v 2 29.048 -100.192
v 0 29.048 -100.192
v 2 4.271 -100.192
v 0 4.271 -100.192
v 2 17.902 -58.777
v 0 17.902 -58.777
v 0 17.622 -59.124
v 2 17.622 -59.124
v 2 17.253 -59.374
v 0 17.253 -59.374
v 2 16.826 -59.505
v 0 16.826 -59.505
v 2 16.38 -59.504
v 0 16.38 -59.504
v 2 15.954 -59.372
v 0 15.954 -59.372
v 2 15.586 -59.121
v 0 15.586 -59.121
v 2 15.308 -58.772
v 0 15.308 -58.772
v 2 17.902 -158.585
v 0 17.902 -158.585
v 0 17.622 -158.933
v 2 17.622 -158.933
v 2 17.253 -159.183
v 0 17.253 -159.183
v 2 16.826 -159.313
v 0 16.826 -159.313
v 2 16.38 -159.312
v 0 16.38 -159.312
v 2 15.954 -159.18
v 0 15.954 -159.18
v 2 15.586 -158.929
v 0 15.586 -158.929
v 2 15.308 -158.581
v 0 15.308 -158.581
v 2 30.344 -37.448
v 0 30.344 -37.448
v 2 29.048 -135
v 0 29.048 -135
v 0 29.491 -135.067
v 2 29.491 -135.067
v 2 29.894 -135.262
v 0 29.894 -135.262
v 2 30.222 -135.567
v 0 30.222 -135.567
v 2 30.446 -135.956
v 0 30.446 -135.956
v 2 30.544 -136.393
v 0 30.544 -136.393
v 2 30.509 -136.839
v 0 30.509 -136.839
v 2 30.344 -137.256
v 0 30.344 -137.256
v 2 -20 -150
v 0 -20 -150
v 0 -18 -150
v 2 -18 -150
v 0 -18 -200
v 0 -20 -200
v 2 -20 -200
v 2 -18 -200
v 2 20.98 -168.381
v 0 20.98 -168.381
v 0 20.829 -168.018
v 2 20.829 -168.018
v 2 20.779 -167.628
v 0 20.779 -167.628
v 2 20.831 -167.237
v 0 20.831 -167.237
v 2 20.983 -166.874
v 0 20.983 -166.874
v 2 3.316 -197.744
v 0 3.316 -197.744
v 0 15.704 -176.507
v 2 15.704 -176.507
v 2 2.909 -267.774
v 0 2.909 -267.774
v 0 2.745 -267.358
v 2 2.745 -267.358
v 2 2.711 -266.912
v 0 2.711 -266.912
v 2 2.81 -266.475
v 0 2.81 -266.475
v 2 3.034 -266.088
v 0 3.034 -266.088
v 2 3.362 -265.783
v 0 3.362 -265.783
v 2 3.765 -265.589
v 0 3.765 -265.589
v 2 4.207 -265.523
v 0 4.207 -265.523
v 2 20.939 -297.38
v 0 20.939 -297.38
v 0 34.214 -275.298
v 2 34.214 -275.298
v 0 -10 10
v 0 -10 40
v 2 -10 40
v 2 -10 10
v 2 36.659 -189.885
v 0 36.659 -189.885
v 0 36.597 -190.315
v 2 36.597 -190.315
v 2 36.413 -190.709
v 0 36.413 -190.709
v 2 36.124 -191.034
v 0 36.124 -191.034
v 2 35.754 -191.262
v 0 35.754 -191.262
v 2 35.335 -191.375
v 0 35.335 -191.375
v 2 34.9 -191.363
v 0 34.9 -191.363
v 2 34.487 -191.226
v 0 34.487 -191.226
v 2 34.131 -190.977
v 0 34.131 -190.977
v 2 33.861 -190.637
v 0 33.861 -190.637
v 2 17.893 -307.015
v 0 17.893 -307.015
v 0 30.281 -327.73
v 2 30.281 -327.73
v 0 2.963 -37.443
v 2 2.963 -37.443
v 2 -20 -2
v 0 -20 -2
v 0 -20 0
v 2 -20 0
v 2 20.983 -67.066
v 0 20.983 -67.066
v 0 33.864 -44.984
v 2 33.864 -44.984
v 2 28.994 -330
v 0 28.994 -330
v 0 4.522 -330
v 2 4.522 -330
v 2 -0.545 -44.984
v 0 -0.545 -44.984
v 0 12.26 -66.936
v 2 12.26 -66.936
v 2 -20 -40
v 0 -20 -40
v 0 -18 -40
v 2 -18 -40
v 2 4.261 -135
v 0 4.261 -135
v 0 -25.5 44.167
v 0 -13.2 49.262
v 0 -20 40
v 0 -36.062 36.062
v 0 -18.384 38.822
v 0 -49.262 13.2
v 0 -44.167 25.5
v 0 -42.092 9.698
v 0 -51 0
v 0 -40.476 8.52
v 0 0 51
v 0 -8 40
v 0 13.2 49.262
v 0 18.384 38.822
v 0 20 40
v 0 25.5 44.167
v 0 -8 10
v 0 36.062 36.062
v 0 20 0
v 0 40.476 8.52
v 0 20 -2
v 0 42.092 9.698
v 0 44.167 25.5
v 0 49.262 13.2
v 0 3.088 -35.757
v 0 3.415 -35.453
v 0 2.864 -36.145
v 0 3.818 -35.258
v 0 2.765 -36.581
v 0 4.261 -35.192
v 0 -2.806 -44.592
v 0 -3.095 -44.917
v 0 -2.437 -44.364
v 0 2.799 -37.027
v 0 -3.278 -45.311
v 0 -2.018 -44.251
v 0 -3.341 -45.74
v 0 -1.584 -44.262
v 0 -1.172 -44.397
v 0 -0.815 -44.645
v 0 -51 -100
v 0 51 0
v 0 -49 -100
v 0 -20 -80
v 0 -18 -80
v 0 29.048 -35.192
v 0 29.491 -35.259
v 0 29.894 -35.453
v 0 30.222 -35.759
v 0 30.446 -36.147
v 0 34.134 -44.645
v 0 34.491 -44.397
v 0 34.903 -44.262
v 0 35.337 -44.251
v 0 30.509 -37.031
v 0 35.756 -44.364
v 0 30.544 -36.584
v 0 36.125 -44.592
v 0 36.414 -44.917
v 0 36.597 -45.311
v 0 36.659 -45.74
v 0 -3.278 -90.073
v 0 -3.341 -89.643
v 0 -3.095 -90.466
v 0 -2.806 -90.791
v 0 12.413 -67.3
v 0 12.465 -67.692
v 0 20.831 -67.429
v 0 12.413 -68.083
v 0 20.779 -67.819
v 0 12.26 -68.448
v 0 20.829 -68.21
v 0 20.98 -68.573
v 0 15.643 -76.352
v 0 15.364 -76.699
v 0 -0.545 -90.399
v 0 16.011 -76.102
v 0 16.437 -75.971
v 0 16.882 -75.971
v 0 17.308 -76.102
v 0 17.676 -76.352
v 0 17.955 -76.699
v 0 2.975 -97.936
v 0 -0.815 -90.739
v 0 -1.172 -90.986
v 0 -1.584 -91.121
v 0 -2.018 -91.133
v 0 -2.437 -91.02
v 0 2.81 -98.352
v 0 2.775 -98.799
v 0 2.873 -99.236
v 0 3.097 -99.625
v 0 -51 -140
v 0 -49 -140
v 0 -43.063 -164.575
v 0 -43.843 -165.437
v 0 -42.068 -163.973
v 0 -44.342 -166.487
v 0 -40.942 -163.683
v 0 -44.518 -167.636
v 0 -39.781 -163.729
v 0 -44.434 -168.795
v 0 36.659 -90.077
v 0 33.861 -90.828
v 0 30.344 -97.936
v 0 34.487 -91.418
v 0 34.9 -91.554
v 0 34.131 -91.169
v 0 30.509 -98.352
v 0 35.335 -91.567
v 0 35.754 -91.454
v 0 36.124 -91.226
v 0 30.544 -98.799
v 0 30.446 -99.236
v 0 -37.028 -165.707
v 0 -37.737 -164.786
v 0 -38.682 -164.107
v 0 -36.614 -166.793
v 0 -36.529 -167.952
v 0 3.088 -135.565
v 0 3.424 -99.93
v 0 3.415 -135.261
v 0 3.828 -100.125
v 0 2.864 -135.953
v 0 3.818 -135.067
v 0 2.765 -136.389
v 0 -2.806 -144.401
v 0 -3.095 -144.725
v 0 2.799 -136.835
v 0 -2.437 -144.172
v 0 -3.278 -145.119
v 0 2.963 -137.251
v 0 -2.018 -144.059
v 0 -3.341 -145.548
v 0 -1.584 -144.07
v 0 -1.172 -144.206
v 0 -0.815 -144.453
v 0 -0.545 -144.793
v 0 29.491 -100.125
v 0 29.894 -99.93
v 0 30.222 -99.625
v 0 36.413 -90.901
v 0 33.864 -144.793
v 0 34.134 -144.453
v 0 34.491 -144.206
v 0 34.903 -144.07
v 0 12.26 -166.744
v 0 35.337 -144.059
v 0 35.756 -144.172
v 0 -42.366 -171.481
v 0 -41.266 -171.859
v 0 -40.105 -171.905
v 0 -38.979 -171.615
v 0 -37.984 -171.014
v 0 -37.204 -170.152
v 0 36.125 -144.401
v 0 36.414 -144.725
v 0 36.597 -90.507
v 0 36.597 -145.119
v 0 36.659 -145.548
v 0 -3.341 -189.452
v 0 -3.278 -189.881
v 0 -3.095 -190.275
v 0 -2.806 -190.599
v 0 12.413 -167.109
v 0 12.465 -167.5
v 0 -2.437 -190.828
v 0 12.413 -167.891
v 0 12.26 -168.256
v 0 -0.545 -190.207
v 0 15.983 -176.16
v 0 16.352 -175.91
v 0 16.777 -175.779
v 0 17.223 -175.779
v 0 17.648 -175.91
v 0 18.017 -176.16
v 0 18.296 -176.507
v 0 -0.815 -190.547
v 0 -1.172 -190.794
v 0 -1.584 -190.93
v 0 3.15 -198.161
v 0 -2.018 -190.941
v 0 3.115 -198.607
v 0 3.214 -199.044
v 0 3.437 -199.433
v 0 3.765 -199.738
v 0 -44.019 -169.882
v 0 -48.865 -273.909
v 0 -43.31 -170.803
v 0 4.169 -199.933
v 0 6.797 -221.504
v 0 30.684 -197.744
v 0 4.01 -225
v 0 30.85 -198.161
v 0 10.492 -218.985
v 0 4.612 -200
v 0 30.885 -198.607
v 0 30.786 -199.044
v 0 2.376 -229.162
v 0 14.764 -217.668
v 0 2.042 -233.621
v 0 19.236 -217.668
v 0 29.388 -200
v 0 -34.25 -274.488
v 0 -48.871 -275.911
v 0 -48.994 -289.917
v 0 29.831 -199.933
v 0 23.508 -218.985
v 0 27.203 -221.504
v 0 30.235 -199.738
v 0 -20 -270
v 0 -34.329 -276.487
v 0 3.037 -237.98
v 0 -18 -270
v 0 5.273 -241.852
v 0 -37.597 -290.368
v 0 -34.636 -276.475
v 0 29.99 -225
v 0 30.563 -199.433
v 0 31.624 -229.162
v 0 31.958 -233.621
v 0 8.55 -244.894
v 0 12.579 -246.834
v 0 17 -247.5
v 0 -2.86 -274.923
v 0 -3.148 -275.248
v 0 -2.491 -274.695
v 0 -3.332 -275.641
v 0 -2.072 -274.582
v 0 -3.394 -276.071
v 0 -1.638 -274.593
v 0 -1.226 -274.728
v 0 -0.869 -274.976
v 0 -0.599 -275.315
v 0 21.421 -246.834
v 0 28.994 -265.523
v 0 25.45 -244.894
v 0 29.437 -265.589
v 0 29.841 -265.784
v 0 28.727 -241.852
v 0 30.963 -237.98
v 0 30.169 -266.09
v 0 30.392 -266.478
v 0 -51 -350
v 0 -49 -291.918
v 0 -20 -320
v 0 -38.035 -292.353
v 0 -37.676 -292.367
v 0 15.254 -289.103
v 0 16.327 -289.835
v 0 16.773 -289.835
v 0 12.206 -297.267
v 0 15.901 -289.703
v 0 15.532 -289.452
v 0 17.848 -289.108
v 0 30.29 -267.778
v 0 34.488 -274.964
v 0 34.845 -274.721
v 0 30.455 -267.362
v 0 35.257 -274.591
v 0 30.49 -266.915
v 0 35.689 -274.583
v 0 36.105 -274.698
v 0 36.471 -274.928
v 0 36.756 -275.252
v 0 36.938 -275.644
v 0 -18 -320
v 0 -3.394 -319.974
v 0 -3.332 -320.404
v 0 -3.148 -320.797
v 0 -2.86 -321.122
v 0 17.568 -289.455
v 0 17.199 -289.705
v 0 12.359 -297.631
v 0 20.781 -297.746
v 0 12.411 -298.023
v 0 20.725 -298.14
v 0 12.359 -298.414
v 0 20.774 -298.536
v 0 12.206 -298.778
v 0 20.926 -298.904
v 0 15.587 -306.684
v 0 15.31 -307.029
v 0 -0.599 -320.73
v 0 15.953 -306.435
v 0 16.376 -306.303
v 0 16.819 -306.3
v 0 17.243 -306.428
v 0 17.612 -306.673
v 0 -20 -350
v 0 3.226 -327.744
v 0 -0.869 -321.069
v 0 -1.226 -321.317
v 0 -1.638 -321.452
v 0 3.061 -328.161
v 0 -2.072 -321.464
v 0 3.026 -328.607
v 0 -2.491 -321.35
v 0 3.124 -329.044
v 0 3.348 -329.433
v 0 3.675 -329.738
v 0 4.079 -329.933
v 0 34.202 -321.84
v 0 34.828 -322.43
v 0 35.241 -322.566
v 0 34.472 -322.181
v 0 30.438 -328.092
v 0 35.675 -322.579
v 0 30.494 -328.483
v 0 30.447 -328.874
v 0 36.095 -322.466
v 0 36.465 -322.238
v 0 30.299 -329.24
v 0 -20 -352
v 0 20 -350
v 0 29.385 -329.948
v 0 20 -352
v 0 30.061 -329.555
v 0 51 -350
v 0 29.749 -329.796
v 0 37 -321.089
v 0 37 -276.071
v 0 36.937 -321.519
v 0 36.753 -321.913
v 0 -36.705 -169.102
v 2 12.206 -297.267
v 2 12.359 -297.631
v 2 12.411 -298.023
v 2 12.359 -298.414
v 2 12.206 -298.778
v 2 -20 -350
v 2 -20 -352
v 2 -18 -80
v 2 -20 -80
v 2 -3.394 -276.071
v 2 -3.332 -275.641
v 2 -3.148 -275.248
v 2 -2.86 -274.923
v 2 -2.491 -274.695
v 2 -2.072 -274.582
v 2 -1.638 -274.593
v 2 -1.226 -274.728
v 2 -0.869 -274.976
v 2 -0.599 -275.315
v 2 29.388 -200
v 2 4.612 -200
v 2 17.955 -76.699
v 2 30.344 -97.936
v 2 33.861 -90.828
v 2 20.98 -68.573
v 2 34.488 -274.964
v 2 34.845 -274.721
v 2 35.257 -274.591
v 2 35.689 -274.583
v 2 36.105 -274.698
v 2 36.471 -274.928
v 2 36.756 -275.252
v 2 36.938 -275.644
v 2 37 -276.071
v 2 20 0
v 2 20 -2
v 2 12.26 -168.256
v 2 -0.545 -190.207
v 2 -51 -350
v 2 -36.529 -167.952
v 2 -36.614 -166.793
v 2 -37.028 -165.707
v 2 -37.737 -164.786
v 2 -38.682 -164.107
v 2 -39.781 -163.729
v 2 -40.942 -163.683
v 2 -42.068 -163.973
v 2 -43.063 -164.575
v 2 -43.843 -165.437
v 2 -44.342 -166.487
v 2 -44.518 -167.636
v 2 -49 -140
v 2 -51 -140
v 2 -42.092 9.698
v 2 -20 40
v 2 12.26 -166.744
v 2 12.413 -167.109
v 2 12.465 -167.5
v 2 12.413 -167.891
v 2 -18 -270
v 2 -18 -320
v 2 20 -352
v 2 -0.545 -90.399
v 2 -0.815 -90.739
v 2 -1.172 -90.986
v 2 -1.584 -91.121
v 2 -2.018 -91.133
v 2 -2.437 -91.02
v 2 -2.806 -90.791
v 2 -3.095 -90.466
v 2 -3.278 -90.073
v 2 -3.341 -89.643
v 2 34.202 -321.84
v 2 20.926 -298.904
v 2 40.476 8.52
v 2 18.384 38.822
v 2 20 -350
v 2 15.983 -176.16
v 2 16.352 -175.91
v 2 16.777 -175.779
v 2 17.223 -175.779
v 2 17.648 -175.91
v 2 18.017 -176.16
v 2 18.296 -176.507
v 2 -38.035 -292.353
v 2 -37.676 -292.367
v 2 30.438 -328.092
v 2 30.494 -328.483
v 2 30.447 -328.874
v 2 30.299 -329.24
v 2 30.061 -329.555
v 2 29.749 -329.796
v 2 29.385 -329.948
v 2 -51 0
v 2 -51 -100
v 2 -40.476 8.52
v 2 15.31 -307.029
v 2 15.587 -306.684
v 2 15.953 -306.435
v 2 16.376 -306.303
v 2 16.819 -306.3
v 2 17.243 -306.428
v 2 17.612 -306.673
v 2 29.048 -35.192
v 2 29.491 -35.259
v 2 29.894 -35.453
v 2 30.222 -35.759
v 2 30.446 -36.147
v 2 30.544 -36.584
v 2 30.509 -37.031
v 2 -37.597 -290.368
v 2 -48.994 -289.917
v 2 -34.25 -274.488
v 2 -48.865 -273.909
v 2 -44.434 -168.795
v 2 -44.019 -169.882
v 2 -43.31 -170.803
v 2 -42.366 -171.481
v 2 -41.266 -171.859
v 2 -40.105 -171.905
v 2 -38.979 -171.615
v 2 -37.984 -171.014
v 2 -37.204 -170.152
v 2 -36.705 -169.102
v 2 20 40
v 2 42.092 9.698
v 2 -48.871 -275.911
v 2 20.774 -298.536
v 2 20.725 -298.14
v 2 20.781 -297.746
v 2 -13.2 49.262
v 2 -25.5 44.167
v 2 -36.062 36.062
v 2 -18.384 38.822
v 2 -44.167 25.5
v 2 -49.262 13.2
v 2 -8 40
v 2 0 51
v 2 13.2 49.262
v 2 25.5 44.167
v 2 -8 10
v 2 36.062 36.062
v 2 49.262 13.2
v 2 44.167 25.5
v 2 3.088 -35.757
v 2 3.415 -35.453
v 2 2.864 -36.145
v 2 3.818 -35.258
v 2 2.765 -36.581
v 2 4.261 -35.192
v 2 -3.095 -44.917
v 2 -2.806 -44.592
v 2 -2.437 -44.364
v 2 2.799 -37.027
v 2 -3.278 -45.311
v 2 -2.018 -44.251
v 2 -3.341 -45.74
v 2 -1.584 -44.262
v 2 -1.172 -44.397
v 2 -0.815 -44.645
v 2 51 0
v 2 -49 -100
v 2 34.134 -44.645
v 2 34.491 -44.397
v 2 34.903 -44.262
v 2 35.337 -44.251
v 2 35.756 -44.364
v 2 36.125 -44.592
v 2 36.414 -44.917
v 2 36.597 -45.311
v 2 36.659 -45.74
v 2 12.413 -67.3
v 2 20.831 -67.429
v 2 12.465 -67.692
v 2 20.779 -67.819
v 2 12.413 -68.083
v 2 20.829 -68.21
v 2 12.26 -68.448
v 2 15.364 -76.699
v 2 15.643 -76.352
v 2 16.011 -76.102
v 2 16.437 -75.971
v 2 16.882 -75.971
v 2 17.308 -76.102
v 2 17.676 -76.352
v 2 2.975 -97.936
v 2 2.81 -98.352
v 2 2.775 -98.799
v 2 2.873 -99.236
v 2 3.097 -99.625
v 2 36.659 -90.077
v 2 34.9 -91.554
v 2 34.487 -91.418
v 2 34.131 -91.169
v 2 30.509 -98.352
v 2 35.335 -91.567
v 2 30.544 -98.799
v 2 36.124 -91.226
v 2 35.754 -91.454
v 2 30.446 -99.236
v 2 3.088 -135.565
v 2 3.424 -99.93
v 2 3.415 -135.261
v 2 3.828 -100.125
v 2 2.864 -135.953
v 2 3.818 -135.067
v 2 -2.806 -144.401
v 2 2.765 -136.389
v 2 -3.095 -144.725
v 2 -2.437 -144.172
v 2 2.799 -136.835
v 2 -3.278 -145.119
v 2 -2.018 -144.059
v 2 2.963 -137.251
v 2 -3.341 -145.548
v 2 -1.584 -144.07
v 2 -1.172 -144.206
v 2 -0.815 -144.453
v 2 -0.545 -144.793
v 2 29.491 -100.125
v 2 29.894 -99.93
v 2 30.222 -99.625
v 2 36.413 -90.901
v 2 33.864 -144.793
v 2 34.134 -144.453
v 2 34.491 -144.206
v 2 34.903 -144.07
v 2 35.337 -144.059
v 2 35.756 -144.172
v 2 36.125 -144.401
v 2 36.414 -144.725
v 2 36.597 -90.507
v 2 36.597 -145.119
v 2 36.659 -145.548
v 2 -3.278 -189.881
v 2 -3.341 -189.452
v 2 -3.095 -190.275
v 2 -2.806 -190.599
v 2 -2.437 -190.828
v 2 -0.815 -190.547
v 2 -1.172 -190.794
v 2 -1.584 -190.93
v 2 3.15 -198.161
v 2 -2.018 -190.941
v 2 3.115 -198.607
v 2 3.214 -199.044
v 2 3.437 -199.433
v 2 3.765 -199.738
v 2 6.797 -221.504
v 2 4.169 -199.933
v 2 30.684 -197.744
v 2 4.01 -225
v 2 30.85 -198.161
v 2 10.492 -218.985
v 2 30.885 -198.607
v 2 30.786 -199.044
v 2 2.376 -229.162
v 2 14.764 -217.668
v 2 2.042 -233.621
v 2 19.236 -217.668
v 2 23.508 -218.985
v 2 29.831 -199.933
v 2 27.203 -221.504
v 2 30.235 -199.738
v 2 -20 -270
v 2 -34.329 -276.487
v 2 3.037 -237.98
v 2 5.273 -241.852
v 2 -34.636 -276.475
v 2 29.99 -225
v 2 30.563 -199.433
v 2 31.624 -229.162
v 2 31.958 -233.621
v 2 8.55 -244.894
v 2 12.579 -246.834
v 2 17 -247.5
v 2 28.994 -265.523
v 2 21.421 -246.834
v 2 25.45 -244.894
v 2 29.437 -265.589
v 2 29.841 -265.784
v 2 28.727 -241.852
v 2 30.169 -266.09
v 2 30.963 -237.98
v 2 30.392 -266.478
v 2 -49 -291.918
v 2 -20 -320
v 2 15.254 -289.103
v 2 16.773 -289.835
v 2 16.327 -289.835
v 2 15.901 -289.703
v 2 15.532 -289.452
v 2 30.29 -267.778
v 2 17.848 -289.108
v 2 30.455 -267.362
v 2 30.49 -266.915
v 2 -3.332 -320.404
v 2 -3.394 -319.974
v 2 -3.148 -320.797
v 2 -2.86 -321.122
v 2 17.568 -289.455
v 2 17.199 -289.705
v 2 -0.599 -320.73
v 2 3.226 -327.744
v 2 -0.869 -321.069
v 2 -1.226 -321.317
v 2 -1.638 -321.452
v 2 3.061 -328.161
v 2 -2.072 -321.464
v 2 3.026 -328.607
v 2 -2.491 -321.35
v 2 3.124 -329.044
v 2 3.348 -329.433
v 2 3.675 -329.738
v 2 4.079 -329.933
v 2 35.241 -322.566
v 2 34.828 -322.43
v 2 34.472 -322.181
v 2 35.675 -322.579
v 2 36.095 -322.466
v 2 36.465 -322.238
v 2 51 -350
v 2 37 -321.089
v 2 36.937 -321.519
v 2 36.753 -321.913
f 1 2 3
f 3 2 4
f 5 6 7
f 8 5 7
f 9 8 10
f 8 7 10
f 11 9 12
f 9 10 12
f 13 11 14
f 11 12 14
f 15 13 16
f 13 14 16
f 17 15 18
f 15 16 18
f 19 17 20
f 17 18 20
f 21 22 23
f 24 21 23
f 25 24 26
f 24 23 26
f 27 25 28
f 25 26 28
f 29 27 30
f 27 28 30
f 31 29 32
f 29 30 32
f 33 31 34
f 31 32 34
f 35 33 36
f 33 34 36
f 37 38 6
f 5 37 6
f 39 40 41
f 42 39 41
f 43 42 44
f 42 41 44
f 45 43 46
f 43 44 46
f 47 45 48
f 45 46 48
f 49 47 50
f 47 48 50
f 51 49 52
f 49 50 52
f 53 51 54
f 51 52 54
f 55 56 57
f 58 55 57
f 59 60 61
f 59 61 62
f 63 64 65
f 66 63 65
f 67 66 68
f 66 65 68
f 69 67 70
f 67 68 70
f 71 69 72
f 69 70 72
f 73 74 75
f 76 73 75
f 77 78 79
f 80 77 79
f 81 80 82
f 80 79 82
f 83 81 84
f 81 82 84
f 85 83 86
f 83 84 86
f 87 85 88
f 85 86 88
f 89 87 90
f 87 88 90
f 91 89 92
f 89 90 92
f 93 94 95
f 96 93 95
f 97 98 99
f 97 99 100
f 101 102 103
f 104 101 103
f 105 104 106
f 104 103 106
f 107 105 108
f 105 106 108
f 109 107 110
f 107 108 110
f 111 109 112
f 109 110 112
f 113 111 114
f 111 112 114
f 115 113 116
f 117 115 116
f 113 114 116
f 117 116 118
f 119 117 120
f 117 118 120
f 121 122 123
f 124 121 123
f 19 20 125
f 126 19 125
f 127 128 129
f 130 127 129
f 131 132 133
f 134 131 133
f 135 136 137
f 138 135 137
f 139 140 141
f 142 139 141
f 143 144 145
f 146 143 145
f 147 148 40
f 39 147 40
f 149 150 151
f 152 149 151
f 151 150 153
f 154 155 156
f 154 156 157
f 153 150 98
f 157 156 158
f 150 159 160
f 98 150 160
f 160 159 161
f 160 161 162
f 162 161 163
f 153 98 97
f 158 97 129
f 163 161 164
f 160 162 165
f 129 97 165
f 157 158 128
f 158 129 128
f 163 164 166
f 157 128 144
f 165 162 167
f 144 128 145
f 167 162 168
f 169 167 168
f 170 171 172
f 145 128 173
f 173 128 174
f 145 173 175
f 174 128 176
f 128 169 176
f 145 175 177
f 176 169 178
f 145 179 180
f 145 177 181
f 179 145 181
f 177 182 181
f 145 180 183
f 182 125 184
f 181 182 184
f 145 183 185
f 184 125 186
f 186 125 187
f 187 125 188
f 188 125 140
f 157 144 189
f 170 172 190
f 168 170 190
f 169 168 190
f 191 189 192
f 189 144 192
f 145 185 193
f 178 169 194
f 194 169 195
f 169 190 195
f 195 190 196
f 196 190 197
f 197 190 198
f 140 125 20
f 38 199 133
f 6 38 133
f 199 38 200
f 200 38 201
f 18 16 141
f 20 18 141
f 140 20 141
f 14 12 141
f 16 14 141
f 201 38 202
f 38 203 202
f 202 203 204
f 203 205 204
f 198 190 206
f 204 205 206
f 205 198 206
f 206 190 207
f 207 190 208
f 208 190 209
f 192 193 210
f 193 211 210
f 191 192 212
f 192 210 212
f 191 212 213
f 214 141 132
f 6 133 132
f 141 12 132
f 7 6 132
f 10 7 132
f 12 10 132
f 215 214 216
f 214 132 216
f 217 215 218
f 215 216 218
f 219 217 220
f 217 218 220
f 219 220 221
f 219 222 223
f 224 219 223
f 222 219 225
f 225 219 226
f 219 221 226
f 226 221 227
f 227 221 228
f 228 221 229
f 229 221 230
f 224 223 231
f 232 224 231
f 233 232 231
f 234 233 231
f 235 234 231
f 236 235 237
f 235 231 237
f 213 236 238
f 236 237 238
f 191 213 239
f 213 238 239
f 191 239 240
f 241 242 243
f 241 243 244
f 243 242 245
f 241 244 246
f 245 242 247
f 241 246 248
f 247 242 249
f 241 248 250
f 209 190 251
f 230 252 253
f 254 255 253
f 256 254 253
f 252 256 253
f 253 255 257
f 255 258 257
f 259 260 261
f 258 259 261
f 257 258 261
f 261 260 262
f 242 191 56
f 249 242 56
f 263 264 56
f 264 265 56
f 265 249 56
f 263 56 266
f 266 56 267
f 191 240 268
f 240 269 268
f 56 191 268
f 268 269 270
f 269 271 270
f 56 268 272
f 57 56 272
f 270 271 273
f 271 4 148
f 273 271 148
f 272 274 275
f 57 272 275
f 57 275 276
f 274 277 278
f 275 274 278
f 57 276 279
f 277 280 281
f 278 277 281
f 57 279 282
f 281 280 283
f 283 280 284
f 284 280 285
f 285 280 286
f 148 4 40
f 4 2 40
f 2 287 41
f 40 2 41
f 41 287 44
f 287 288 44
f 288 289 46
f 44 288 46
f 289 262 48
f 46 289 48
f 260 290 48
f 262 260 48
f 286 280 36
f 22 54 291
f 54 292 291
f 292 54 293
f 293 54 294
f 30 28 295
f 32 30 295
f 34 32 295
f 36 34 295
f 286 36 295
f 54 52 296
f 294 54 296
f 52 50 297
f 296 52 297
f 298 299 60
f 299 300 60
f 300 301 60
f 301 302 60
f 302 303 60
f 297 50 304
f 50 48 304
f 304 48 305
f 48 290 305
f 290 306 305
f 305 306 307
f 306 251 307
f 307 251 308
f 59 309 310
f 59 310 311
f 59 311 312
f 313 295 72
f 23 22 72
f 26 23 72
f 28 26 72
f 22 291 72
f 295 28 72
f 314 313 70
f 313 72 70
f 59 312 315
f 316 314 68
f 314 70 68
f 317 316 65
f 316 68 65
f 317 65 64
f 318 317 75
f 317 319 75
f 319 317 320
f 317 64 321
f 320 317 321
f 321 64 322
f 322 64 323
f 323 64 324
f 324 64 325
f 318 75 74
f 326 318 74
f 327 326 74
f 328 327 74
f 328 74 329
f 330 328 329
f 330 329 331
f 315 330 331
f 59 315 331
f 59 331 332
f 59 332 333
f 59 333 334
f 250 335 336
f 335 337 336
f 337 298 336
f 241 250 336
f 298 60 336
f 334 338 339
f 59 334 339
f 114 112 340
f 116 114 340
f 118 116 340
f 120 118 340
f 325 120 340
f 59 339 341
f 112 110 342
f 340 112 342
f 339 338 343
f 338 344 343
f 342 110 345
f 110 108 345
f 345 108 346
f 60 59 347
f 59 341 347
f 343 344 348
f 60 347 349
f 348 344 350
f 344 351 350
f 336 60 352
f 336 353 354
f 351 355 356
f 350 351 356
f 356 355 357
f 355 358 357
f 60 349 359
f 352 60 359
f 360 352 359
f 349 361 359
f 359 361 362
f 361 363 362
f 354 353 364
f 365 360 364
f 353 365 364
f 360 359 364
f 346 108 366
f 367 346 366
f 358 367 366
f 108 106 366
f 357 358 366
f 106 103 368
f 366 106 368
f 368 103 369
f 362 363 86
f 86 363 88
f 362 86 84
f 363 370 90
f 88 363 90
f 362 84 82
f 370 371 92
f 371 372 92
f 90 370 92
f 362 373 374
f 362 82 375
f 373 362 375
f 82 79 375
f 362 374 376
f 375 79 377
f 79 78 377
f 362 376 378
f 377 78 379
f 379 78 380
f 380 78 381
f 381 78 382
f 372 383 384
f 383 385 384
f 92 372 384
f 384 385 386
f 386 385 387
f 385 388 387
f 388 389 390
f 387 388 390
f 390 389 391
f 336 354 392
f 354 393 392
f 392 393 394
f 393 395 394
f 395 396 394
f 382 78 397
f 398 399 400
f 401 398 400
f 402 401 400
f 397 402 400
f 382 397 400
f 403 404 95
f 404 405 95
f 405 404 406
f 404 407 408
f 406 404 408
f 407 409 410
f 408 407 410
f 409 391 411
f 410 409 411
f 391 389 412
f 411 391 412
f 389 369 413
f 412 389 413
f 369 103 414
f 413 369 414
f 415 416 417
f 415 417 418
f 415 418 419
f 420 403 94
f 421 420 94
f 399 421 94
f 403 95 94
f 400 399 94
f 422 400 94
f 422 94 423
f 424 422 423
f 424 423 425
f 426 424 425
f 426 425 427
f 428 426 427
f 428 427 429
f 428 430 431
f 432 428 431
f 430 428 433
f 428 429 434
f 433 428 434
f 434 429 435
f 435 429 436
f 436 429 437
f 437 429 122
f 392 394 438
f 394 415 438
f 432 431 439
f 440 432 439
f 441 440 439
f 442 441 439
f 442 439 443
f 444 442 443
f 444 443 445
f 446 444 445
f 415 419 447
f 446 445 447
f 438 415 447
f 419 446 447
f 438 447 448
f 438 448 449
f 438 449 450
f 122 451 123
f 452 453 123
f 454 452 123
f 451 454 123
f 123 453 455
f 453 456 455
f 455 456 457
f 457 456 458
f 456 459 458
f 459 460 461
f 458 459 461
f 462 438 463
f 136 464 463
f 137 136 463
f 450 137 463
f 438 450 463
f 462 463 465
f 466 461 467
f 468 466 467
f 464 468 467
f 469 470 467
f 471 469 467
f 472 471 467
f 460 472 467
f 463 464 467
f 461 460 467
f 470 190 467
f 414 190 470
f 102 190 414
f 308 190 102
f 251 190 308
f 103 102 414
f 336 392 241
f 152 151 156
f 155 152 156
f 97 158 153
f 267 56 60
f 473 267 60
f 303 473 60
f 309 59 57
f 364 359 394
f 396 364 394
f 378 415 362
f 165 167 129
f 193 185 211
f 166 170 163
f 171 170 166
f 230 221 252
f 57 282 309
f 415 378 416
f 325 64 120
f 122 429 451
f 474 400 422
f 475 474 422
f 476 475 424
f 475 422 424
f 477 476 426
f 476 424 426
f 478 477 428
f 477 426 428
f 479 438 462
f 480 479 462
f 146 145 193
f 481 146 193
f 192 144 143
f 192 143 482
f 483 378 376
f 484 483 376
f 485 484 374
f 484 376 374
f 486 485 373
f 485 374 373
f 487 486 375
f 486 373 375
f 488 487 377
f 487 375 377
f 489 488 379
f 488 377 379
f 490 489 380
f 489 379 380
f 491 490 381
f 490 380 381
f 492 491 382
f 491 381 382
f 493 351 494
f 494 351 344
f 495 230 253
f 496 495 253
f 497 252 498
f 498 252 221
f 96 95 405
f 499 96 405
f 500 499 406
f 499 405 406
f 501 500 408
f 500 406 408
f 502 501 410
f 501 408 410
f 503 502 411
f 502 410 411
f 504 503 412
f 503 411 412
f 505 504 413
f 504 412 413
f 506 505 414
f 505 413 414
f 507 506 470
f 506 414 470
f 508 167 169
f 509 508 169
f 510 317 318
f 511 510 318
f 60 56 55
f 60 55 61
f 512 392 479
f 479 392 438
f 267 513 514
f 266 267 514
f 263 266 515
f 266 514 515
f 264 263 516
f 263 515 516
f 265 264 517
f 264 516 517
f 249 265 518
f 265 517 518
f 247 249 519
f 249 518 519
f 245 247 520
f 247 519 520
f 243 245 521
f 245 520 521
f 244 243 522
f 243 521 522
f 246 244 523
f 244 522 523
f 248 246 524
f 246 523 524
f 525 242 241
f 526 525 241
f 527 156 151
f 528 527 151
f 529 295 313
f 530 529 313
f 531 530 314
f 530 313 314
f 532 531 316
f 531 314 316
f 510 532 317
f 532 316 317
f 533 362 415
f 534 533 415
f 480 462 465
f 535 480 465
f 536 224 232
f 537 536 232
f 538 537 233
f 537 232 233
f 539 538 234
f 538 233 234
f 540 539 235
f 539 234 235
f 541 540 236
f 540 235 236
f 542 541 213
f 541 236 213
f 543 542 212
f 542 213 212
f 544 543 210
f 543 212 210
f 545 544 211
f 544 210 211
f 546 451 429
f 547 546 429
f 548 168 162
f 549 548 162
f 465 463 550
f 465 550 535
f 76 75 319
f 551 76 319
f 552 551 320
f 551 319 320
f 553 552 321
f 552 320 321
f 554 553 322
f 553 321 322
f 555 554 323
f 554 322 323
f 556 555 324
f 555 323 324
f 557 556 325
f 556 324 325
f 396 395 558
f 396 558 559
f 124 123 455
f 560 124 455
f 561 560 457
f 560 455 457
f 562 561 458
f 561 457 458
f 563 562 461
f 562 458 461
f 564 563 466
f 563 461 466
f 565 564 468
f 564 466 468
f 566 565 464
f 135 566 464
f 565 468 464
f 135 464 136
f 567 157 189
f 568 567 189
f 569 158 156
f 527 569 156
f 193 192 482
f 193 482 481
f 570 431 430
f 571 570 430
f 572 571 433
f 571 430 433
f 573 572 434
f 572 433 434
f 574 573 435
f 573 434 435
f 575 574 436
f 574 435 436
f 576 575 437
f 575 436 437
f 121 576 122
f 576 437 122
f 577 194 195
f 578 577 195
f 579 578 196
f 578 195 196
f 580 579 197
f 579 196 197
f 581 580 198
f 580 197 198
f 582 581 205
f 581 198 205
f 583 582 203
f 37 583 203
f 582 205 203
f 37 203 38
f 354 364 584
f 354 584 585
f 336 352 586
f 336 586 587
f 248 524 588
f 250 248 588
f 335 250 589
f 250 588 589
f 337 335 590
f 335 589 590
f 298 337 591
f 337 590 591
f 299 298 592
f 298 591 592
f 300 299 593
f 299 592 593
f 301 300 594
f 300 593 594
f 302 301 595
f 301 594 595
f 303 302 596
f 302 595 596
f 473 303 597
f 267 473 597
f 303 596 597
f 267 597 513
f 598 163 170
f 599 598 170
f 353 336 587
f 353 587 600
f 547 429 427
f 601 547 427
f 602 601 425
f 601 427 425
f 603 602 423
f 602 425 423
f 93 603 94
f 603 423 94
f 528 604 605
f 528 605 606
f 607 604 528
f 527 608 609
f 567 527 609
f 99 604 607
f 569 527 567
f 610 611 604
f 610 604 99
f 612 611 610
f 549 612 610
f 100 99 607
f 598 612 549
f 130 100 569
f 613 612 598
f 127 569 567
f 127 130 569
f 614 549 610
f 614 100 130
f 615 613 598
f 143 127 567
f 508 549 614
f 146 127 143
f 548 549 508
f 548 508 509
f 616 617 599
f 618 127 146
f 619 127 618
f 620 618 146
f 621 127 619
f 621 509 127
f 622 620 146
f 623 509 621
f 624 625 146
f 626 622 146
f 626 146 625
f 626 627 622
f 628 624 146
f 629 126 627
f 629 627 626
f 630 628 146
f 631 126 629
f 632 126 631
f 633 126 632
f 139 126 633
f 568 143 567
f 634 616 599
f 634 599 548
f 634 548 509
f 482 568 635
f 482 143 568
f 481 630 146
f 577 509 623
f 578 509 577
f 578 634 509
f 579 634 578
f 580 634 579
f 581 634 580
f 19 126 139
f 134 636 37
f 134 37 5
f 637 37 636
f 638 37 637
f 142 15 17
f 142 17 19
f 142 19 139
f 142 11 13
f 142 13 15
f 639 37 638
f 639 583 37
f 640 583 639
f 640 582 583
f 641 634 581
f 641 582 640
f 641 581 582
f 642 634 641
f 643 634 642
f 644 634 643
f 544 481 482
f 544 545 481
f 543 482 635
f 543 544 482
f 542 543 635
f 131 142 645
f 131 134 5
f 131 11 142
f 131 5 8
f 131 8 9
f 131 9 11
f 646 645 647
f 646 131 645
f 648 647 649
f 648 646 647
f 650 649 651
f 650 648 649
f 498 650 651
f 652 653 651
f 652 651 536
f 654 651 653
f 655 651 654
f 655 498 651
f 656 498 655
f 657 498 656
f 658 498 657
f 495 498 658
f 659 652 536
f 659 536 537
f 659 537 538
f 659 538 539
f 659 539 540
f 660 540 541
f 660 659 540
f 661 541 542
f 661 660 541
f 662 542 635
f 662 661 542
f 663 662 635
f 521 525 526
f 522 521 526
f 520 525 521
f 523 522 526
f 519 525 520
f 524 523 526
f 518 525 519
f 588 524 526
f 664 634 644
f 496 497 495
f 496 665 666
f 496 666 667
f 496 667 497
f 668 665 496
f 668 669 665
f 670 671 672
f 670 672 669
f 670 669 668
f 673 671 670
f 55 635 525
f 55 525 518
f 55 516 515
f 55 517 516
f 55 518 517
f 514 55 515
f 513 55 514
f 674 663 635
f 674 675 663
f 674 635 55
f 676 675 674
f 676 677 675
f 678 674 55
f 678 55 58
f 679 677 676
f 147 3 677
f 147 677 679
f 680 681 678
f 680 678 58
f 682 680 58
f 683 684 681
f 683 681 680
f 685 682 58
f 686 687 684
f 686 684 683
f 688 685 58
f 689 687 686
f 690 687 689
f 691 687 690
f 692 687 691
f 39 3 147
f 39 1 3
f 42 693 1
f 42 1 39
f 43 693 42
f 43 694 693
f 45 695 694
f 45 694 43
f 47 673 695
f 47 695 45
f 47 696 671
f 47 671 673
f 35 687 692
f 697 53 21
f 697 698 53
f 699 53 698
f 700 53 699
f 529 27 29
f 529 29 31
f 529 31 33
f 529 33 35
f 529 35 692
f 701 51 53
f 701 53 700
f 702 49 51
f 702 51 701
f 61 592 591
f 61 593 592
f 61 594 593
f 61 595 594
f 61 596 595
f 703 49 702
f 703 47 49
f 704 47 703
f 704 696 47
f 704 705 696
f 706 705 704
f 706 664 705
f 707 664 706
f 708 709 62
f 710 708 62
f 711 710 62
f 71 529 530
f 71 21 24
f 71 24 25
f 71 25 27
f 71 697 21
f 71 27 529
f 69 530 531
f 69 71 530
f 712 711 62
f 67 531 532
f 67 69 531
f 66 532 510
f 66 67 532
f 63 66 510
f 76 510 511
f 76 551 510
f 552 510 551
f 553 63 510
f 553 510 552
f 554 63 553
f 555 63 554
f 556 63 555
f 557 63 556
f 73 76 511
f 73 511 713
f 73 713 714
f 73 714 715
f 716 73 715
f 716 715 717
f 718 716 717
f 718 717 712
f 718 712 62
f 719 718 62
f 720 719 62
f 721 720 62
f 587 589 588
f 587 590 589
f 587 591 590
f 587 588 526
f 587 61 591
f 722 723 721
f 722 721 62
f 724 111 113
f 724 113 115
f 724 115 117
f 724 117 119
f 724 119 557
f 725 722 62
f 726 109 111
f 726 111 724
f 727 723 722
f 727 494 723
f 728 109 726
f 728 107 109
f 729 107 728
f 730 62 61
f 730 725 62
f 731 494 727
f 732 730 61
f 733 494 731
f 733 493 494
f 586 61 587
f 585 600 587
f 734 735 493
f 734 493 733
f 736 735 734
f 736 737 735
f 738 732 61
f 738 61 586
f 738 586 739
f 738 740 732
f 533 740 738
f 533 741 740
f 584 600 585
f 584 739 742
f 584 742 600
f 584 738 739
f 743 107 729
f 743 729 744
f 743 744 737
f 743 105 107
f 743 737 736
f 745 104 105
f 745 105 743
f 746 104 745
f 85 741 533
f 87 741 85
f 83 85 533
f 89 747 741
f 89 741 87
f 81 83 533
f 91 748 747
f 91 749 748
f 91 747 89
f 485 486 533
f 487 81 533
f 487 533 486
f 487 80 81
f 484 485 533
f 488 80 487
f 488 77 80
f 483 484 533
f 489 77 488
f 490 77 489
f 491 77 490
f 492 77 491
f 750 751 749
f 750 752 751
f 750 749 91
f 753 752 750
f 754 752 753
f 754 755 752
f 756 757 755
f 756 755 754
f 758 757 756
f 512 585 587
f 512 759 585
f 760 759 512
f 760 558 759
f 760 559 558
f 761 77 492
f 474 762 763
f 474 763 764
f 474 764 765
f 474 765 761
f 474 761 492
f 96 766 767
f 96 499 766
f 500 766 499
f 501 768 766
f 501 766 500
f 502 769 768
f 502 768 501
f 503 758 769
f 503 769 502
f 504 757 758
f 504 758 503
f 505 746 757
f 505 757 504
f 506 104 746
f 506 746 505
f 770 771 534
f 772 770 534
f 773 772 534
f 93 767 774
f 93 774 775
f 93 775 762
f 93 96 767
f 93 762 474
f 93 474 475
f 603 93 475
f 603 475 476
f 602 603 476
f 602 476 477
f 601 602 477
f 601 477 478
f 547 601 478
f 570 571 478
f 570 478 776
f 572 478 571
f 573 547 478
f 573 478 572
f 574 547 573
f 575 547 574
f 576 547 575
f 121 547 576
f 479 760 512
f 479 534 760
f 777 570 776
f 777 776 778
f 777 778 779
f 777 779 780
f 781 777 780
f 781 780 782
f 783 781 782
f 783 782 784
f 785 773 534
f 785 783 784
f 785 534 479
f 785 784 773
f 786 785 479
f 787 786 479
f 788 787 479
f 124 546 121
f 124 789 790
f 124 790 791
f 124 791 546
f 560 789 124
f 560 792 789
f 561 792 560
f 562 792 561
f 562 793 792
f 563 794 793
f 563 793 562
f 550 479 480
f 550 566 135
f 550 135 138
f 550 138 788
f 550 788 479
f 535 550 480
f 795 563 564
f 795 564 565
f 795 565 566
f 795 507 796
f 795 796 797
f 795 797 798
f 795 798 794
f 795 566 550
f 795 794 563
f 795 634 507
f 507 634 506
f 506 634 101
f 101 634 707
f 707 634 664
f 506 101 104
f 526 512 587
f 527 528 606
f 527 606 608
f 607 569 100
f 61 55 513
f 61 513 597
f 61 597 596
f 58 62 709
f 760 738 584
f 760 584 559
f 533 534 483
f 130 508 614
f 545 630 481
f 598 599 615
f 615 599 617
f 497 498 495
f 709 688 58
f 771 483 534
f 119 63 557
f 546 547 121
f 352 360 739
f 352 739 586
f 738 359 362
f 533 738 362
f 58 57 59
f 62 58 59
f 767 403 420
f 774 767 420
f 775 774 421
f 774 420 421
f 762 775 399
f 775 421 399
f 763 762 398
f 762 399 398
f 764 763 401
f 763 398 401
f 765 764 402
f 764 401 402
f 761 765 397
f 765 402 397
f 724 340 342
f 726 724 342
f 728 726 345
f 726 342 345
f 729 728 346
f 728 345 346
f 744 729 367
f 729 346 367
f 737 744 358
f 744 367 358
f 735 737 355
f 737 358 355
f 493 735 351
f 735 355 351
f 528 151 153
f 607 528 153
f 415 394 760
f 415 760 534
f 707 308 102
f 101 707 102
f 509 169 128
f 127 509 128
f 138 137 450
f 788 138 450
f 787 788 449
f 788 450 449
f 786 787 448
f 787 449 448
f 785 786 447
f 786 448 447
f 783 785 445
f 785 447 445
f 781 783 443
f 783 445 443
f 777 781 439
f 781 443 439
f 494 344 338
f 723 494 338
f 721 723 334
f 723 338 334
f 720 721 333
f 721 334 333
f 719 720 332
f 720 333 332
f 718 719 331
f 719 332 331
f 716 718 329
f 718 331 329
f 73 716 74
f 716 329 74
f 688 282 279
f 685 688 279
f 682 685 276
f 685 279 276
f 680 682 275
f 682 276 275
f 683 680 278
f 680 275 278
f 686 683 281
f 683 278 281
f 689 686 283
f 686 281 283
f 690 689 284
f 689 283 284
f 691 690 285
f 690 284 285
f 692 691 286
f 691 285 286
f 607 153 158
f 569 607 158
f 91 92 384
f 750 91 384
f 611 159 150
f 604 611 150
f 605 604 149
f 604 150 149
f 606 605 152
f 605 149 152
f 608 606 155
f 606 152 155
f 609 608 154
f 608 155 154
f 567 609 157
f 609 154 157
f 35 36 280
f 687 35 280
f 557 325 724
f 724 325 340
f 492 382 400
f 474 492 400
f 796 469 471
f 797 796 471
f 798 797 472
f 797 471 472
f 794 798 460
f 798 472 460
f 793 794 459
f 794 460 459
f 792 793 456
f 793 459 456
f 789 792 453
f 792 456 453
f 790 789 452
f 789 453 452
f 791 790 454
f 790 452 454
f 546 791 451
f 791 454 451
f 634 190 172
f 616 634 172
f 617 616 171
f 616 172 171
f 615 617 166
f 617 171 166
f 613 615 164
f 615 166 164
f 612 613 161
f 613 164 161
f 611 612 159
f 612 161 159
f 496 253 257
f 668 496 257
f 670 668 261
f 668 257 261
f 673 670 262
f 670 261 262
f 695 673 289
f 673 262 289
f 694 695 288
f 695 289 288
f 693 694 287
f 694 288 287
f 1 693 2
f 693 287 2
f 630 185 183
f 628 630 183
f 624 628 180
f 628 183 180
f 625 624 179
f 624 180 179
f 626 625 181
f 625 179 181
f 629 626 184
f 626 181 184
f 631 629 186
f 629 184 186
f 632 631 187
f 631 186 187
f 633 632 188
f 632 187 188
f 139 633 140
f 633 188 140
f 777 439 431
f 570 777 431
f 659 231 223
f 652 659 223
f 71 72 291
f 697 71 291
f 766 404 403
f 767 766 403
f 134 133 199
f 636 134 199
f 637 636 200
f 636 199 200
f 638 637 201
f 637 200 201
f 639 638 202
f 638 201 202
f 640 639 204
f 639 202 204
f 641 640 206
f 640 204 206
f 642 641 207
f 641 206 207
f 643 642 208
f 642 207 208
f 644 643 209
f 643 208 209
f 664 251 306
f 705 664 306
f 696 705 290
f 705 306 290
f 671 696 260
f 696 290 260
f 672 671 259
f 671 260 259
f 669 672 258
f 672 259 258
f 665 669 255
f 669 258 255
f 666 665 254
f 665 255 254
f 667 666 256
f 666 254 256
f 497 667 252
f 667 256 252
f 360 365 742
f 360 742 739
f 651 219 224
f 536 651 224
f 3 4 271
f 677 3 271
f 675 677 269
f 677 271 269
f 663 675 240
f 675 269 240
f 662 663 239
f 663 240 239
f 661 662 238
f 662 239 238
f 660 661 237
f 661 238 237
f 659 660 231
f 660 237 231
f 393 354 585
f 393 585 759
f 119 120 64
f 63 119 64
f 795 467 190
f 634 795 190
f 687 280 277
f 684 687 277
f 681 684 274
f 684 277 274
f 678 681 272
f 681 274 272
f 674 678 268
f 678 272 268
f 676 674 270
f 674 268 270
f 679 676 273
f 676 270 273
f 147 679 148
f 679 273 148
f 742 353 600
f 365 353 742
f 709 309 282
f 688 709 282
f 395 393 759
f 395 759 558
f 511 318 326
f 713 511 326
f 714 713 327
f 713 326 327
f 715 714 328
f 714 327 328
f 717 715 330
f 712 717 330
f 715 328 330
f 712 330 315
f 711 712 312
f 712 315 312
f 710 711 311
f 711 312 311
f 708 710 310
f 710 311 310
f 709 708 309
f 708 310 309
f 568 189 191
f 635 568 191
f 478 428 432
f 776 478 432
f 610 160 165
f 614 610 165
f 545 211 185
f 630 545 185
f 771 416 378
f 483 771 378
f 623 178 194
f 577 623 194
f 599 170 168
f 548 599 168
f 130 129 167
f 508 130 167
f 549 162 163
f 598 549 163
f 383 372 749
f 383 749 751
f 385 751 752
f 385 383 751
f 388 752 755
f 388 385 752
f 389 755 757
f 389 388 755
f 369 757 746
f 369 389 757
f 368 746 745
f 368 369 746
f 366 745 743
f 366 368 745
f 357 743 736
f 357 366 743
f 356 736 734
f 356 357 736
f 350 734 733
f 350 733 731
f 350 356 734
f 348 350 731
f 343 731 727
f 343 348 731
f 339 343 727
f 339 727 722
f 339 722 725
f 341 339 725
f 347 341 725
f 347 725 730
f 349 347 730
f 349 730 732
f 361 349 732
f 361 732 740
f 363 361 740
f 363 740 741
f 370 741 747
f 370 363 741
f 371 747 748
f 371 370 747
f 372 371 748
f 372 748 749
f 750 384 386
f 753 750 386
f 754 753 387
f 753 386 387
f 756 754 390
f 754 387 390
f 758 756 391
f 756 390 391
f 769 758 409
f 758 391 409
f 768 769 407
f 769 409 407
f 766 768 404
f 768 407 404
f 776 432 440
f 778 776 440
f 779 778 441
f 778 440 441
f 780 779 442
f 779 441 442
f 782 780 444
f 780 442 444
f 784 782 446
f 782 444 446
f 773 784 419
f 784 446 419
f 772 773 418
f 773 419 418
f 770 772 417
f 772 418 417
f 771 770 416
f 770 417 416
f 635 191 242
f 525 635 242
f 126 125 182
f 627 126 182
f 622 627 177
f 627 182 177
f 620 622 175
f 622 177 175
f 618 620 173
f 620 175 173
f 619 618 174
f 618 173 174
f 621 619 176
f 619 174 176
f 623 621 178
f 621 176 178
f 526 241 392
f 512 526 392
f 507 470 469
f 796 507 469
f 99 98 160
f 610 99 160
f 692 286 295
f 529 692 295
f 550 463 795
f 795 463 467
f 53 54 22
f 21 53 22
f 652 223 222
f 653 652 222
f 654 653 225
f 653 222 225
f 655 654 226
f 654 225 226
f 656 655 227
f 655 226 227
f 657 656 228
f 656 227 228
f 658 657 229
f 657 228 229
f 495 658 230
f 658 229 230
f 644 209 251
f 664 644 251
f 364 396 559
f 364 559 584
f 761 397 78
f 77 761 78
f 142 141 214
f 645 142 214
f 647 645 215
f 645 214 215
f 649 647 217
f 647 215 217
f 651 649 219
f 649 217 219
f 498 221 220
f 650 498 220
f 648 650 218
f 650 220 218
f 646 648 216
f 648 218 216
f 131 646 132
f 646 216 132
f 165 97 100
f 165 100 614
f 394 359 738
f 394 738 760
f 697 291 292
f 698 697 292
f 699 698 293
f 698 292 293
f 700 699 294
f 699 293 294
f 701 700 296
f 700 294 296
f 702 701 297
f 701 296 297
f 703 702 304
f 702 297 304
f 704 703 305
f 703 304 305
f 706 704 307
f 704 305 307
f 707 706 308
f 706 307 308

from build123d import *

# Parameters (mm, degrees)
SKETCH_1_W          = 40
SKETCH_1_H          = 2
SKETCH_1_W_2        = 50
SKETCH_1_R          = 15
SKETCH_1_W_3        = 30
SKETCH_1_W_4        = 2
SKETCH_1_H_2        = 40
EXTRUDE_3_DEPTH     = 2
SKETCH_2_W          = 190.078492772
SKETCH_2_H          = 26.673691145
EXTRUDE_4_DEPTH     = 2
CUT_EXTRUDE_1_DEPTH = 2
CUT_EXTRUDE_2_DEPTH = 2


with BuildPart() as part:
    # 草图1 → 凸台-拉伸3 (new body)
    # profile 1 of 4: a face of its own
    with BuildSketch(Plane(origin=(0, 0, 0), x_dir=(0, 0, -1), z_dir=(1, 0, 0))):
        Polygon((139, 51), (0, 51), (0, 20), (2, 20), (2, -20), (0, -20), (0, -51), (100, -51), (100, -49), (140, -49), (140, -51), (350, -51), (350, -20), (350, 20), (350, 51), (337.5, 51), (331.5, 51), (145, 51), align=None)
        with Locations((59.999999544, -18.999999639)):
            Rectangle(SKETCH_1_W, SKETCH_1_H, mode=Mode.SUBTRACT)
        with BuildLine():
            Line((145, -43), (145, -32))
            ThreePointArc((145, -32), (146.757359313, -27.757359313), (151, -26))
            Line((151, -26), (235, -26))
            Line((235, -26), (305, -26))
            Line((305, -26), (325.5, -26))
            ThreePointArc((325.5, -26), (329.742640687, -27.757359313), (331.5, -32))
            Line((331.5, -32), (331.5, -35))
            Line((331.5, -35), (331.5, -43))
            ThreePointArc((331.5, -43), (329.742640687, -47.242640687), (325.5, -49))
            Line((325.5, -49), (151, -49))
            ThreePointArc((151, -49), (146.757359313, -47.242640687), (145, -43))
        make_face(mode=Mode.SUBTRACT)
        with Locations((174.999999544, -18.999999639)):
            Rectangle(SKETCH_1_W_2, SKETCH_1_H, mode=Mode.SUBTRACT)
        with Locations((294.999999544, -18.999999639)):
            Rectangle(SKETCH_1_W_2, SKETCH_1_H, mode=Mode.SUBTRACT)
        with BuildLine():
            Line((35.191745107, 4.260800891), (35.191745107, 29.047933032))
            ThreePointArc((35.191745107, 29.047933032), (35.944654017, 30.348646261), (37.447551645, 30.343601384))
            Line((37.447551645, 30.343601384), (58.776761499, 17.901562302))
            ThreePointArc((58.776761499, 17.901562302), (59.520952796, 16.603345479), (58.772354511, 15.307664881))
            Line((58.772354511, 15.307664881), (37.443144656, 2.962571821))
            ThreePointArc((37.443144656, 2.962571821), (35.942445208, 2.961358833), (35.191745107, 4.260800891))
        make_face(mode=Mode.SUBTRACT)
        with BuildLine():
            Line((89.643364252, -3.340511469), (45.740125962, -3.340511469))
            ThreePointArc((45.740125962, -3.340511469), (44.292109641, -2.231981438), (44.984319423, -0.544843118))
            Line((44.984319423, -0.544843118), (66.935938568, 12.26026805))
            ThreePointArc((66.935938568, 12.26026805), (67.691745107, 12.464599699), (68.447551645, 12.26026805))
            Line((68.447551645, 12.26026805), (90.39917079, -0.544843118))
            ThreePointArc((90.39917079, -0.544843118), (91.091380572, -2.231981438), (89.643364252, -3.340511469))
        make_face(mode=Mode.SUBTRACT)
        with BuildLine():
            ThreePointArc((97.935938568, 30.343601384), (99.438836196, 30.348646261), (100.191745107, 29.047933032))
            Line((100.191745107, 29.047933032), (100.191745107, 4.27104403))
            ThreePointArc((100.191745107, 4.27104403), (99.438836196, 2.970330801), (97.935938568, 2.975375678))
            Line((97.935938568, 2.975375678), (76.698605138, 15.36382018))
            ThreePointArc((76.698605138, 15.36382018), (75.954411676, 16.659488531), (76.698605138, 17.955156882))
            Line((76.698605138, 17.955156882), (97.935938568, 30.343601384))
        make_face(mode=Mode.SUBTRACT)
        with BuildLine():
            Line((134.999999544, 4.260800891), (134.999999544, 29.047933032))
            ThreePointArc((134.999999544, 29.047933032), (135.752908454, 30.348646261), (137.255806082, 30.343601384))
            Line((137.255806082, 30.343601384), (158.585015936, 17.901562302))
            ThreePointArc((158.585015936, 17.901562302), (159.329207233, 16.603345479), (158.580608948, 15.307664881))
            Line((158.580608948, 15.307664881), (137.251399093, 2.962571821))
            ThreePointArc((137.251399093, 2.962571821), (135.750699645, 2.961358833), (134.999999544, 4.260800891))
        make_face(mode=Mode.SUBTRACT)
        with BuildLine():
            ThreePointArc((44.984319423, 33.86382018), (44.292109641, 35.5509585), (45.740125962, 36.659488531))
            Line((45.740125962, 36.659488531), (90.076890905, 36.659488531))
            ThreePointArc((90.076890905, 36.659488531), (91.525570236, 35.548497783), (90.828290455, 33.861259462))
            Line((90.828290455, 33.861259462), (68.573204266, 20.980280188))
            ThreePointArc((68.573204266, 20.980280188), (67.819256245, 20.778511422), (67.065998178, 20.982840906))
            Line((67.065998178, 20.982840906), (44.984319423, 33.86382018))
        make_face(mode=Mode.SUBTRACT)
        with BuildLine():
            Line((189.451618689, -3.340511469), (145.548380399, -3.340511469))
            ThreePointArc((145.548380399, -3.340511469), (144.100364078, -2.231981438), (144.79257386, -0.544843118))
            Line((144.79257386, -0.544843118), (166.744193005, 12.26026805))
            ThreePointArc((166.744193005, 12.26026805), (167.499999544, 12.464599699), (168.255806082, 12.26026805))
            Line((168.255806082, 12.26026805), (190.207425227, -0.544843118))
            ThreePointArc((190.207425227, -0.544843118), (190.899635009, -2.231981438), (189.451618689, -3.340511469))
        make_face(mode=Mode.SUBTRACT)
        with BuildLine():
            ThreePointArc((197.744193005, 30.684113214), (199.247090633, 30.689158091), (199.999999544, 29.388444862))
            Line((199.999999544, 29.388444862), (199.999999544, 4.61155586))
            ThreePointArc((199.999999544, 4.61155586), (199.247090633, 3.310842631), (197.744193005, 3.315887508))
            Line((197.744193005, 3.315887508), (176.506859575, 15.70433201))
            ThreePointArc((176.506859575, 15.70433201), (175.762666113, 17.000000361), (176.506859575, 18.295668712))
            Line((176.506859575, 18.295668712), (197.744193005, 30.684113214))
        make_face(mode=Mode.SUBTRACT)
        with Locations((232.499999544, 17.000000361)):
            Circle(SKETCH_1_R, mode=Mode.SUBTRACT)
        with BuildLine():
            Line((319.974166341, -3.394327578), (276.070928051, -3.394327578))
            ThreePointArc((276.070928051, -3.394327578), (274.622911731, -2.285797546), (275.315121513, -0.598659226))
            Line((275.315121513, -0.598659226), (297.266740658, 12.206451942))
            ThreePointArc((297.266740658, 12.206451942), (298.022547196, 12.41078359), (298.778353734, 12.206451942))
            Line((298.778353734, 12.206451942), (320.729972879, -0.598659226))
            ThreePointArc((320.729972879, -0.598659226), (321.422182661, -2.285797546), (319.974166341, -3.394327578))
        make_face(mode=Mode.SUBTRACT)
        with BuildLine():
            Line((265.522547196, 4.206984782), (265.522547196, 28.994116924))
            ThreePointArc((265.522547196, 28.994116924), (266.275456106, 30.294830153), (267.778353734, 30.289785275))
            Line((267.778353734, 30.289785275), (289.107563589, 17.847746193))
            ThreePointArc((289.107563589, 17.847746193), (289.851754885, 16.549529371), (289.1031566, 15.253848773))
            Line((289.1031566, 15.253848773), (267.773946745, 2.908755713))
            ThreePointArc((267.773946745, 2.908755713), (266.273247297, 2.907542724), (265.522547196, 4.206984782))
        make_face(mode=Mode.SUBTRACT)
        with BuildLine():
            ThreePointArc((327.730104048, 30.281463391), (329.239984934, 30.298885724), (329.999999544, 28.994116924))
            Line((329.999999544, 28.994116924), (329.999999544, 4.522047385))
            ThreePointArc((329.999999544, 4.522047385), (329.247090633, 3.221334156), (327.744193005, 3.226379034))
            Line((327.744193005, 3.226379034), (307.029407227, 15.310004071))
            ThreePointArc((307.029407227, 15.310004071), (306.285236078, 16.597490851), (307.01531827, 17.893018889))
            Line((307.01531827, 17.893018889), (327.730104048, 30.281463391))
        make_face(mode=Mode.SUBTRACT)
        with BuildLine():
            ThreePointArc((144.79257386, 33.86382018), (144.100364078, 35.5509585), (145.548380399, 36.659488531))
            Line((145.548380399, 36.659488531), (189.885145343, 36.659488531))
            ThreePointArc((189.885145343, 36.659488531), (191.333824673, 35.548497783), (190.636544892, 33.861259462))
            Line((190.636544892, 33.861259462), (168.381458703, 20.980280188))
            ThreePointArc((168.381458703, 20.980280188), (167.627510682, 20.778511422), (166.874252615, 20.982840906))
            Line((166.874252615, 20.982840906), (144.79257386, 33.86382018))
        make_face(mode=Mode.SUBTRACT)
        with BuildLine():
            ThreePointArc((275.298058871, 34.214436971), (274.625531032, 35.901033349), (276.070928051, 37.000000361))
            Line((276.070928051, 37.000000361), (321.088992302, 37.000000361))
            ThreePointArc((321.088992302, 37.000000361), (322.537671633, 35.889009613), (321.840391852, 34.201771291))
            Line((321.840391852, 34.201771291), (298.904006355, 20.926464079))
            ThreePointArc((298.904006355, 20.926464079), (298.140143214, 20.72474493), (297.379737626, 20.939129758))
            Line((297.379737626, 20.939129758), (275.298058871, 34.214436971))
        make_face(mode=Mode.SUBTRACT)
    # profile 2 of 4: a face of its own
    with BuildSketch(Plane(origin=(0, 0, 0), x_dir=(0, 0, -1), z_dir=(1, 0, 0))):
        with BuildLine():
            Line((0, 20), (0, 51))
            ThreePointArc((0, 51), (-36.062445841, 36.062445841), (-51, 0))
            Line((-51, 0), (0, 0))
            Line((0, 0), (0, 20))
        make_face()
        Polygon((-38.821768829, 18.383902445), (-40, 20), (-9.698170842, 42.091834457), (-8.519939671, 40.475736902), align=None, mode=Mode.SUBTRACT)
    # profile 3 of 4: a face of its own
    with BuildSketch(Plane(origin=(0, 0, 0), x_dir=(0, 0, -1), z_dir=(1, 0, 0))):
        with BuildLine():
            Line((0, 0), (-51, 0))
            ThreePointArc((-51, 0), (-36.062445841, -36.062445841), (0, -51))
            Line((0, -51), (0, -20))
            Line((0, -20), (0, 0))
        make_face()
        Polygon((-40, -20), (-38.821768829, -18.383902445), (-8.519939671, -40.475736902), (-9.698170842, -42.091834457), align=None, mode=Mode.SUBTRACT)
        with Locations((-25, -9)):
            Rectangle(SKETCH_1_W_3, SKETCH_1_H, mode=Mode.SUBTRACT)
    # profile 4 of 4: a face of its own
    with BuildSketch(Plane(origin=(0, 0, 0), x_dir=(0, 0, -1), z_dir=(1, 0, 0))):
        with Locations((351, 0)):
            Rectangle(SKETCH_1_W_4, SKETCH_1_H_2)
    extrude(amount=EXTRUDE_3_DEPTH)

    # 草图2 → 凸台-拉伸4 (add)
    with BuildSketch(Plane(origin=(2, 0, 0), x_dir=(0, 0, -1), z_dir=(1, 0, 0))):
        with Locations((237.791738903, -36.733598544)):
            Rectangle(SKETCH_2_W, SKETCH_2_H)
    extrude(amount=-EXTRUDE_4_DEPTH)

    # 草图3 → 切除-拉伸1 (cut)
    with BuildSketch(Plane.ZY):
        Polygon((-276.474715487, -34.635525304), (-276.486854743, -34.329149941), (-274.488422813, -34.249967741), (-273.909339591, -48.865100933), (-275.910680122, -48.870874702), align=None)
        Polygon((-291.918118303, -49), (-292.352577698, -38.034940321), (-292.366784403, -37.676385824), (-290.368352473, -37.597203626), (-289.916778482, -48.994208323), align=None)
    extrude(amount=-CUT_EXTRUDE_1_DEPTH, mode=Mode.SUBTRACT)

    # 草图4 → 切除-拉伸2 (cut)
    with BuildSketch(Plane(origin=(2, 0, 0), x_dir=(0, 0, -1), z_dir=(1, 0, 0))):
        with BuildLine():
            ThreePointArc((167.635934129, -44.518280263), (171.92449544, -40.687294754), (167.952486385, -36.529007588))
            ThreePointArc((167.952486385, -36.529007588), (163.663925074, -40.359993097), (167.635934129, -44.518280263))
        make_face()
    extrude(amount=-CUT_EXTRUDE_2_DEPTH, mode=Mode.SUBTRACT)


solid = part.part
